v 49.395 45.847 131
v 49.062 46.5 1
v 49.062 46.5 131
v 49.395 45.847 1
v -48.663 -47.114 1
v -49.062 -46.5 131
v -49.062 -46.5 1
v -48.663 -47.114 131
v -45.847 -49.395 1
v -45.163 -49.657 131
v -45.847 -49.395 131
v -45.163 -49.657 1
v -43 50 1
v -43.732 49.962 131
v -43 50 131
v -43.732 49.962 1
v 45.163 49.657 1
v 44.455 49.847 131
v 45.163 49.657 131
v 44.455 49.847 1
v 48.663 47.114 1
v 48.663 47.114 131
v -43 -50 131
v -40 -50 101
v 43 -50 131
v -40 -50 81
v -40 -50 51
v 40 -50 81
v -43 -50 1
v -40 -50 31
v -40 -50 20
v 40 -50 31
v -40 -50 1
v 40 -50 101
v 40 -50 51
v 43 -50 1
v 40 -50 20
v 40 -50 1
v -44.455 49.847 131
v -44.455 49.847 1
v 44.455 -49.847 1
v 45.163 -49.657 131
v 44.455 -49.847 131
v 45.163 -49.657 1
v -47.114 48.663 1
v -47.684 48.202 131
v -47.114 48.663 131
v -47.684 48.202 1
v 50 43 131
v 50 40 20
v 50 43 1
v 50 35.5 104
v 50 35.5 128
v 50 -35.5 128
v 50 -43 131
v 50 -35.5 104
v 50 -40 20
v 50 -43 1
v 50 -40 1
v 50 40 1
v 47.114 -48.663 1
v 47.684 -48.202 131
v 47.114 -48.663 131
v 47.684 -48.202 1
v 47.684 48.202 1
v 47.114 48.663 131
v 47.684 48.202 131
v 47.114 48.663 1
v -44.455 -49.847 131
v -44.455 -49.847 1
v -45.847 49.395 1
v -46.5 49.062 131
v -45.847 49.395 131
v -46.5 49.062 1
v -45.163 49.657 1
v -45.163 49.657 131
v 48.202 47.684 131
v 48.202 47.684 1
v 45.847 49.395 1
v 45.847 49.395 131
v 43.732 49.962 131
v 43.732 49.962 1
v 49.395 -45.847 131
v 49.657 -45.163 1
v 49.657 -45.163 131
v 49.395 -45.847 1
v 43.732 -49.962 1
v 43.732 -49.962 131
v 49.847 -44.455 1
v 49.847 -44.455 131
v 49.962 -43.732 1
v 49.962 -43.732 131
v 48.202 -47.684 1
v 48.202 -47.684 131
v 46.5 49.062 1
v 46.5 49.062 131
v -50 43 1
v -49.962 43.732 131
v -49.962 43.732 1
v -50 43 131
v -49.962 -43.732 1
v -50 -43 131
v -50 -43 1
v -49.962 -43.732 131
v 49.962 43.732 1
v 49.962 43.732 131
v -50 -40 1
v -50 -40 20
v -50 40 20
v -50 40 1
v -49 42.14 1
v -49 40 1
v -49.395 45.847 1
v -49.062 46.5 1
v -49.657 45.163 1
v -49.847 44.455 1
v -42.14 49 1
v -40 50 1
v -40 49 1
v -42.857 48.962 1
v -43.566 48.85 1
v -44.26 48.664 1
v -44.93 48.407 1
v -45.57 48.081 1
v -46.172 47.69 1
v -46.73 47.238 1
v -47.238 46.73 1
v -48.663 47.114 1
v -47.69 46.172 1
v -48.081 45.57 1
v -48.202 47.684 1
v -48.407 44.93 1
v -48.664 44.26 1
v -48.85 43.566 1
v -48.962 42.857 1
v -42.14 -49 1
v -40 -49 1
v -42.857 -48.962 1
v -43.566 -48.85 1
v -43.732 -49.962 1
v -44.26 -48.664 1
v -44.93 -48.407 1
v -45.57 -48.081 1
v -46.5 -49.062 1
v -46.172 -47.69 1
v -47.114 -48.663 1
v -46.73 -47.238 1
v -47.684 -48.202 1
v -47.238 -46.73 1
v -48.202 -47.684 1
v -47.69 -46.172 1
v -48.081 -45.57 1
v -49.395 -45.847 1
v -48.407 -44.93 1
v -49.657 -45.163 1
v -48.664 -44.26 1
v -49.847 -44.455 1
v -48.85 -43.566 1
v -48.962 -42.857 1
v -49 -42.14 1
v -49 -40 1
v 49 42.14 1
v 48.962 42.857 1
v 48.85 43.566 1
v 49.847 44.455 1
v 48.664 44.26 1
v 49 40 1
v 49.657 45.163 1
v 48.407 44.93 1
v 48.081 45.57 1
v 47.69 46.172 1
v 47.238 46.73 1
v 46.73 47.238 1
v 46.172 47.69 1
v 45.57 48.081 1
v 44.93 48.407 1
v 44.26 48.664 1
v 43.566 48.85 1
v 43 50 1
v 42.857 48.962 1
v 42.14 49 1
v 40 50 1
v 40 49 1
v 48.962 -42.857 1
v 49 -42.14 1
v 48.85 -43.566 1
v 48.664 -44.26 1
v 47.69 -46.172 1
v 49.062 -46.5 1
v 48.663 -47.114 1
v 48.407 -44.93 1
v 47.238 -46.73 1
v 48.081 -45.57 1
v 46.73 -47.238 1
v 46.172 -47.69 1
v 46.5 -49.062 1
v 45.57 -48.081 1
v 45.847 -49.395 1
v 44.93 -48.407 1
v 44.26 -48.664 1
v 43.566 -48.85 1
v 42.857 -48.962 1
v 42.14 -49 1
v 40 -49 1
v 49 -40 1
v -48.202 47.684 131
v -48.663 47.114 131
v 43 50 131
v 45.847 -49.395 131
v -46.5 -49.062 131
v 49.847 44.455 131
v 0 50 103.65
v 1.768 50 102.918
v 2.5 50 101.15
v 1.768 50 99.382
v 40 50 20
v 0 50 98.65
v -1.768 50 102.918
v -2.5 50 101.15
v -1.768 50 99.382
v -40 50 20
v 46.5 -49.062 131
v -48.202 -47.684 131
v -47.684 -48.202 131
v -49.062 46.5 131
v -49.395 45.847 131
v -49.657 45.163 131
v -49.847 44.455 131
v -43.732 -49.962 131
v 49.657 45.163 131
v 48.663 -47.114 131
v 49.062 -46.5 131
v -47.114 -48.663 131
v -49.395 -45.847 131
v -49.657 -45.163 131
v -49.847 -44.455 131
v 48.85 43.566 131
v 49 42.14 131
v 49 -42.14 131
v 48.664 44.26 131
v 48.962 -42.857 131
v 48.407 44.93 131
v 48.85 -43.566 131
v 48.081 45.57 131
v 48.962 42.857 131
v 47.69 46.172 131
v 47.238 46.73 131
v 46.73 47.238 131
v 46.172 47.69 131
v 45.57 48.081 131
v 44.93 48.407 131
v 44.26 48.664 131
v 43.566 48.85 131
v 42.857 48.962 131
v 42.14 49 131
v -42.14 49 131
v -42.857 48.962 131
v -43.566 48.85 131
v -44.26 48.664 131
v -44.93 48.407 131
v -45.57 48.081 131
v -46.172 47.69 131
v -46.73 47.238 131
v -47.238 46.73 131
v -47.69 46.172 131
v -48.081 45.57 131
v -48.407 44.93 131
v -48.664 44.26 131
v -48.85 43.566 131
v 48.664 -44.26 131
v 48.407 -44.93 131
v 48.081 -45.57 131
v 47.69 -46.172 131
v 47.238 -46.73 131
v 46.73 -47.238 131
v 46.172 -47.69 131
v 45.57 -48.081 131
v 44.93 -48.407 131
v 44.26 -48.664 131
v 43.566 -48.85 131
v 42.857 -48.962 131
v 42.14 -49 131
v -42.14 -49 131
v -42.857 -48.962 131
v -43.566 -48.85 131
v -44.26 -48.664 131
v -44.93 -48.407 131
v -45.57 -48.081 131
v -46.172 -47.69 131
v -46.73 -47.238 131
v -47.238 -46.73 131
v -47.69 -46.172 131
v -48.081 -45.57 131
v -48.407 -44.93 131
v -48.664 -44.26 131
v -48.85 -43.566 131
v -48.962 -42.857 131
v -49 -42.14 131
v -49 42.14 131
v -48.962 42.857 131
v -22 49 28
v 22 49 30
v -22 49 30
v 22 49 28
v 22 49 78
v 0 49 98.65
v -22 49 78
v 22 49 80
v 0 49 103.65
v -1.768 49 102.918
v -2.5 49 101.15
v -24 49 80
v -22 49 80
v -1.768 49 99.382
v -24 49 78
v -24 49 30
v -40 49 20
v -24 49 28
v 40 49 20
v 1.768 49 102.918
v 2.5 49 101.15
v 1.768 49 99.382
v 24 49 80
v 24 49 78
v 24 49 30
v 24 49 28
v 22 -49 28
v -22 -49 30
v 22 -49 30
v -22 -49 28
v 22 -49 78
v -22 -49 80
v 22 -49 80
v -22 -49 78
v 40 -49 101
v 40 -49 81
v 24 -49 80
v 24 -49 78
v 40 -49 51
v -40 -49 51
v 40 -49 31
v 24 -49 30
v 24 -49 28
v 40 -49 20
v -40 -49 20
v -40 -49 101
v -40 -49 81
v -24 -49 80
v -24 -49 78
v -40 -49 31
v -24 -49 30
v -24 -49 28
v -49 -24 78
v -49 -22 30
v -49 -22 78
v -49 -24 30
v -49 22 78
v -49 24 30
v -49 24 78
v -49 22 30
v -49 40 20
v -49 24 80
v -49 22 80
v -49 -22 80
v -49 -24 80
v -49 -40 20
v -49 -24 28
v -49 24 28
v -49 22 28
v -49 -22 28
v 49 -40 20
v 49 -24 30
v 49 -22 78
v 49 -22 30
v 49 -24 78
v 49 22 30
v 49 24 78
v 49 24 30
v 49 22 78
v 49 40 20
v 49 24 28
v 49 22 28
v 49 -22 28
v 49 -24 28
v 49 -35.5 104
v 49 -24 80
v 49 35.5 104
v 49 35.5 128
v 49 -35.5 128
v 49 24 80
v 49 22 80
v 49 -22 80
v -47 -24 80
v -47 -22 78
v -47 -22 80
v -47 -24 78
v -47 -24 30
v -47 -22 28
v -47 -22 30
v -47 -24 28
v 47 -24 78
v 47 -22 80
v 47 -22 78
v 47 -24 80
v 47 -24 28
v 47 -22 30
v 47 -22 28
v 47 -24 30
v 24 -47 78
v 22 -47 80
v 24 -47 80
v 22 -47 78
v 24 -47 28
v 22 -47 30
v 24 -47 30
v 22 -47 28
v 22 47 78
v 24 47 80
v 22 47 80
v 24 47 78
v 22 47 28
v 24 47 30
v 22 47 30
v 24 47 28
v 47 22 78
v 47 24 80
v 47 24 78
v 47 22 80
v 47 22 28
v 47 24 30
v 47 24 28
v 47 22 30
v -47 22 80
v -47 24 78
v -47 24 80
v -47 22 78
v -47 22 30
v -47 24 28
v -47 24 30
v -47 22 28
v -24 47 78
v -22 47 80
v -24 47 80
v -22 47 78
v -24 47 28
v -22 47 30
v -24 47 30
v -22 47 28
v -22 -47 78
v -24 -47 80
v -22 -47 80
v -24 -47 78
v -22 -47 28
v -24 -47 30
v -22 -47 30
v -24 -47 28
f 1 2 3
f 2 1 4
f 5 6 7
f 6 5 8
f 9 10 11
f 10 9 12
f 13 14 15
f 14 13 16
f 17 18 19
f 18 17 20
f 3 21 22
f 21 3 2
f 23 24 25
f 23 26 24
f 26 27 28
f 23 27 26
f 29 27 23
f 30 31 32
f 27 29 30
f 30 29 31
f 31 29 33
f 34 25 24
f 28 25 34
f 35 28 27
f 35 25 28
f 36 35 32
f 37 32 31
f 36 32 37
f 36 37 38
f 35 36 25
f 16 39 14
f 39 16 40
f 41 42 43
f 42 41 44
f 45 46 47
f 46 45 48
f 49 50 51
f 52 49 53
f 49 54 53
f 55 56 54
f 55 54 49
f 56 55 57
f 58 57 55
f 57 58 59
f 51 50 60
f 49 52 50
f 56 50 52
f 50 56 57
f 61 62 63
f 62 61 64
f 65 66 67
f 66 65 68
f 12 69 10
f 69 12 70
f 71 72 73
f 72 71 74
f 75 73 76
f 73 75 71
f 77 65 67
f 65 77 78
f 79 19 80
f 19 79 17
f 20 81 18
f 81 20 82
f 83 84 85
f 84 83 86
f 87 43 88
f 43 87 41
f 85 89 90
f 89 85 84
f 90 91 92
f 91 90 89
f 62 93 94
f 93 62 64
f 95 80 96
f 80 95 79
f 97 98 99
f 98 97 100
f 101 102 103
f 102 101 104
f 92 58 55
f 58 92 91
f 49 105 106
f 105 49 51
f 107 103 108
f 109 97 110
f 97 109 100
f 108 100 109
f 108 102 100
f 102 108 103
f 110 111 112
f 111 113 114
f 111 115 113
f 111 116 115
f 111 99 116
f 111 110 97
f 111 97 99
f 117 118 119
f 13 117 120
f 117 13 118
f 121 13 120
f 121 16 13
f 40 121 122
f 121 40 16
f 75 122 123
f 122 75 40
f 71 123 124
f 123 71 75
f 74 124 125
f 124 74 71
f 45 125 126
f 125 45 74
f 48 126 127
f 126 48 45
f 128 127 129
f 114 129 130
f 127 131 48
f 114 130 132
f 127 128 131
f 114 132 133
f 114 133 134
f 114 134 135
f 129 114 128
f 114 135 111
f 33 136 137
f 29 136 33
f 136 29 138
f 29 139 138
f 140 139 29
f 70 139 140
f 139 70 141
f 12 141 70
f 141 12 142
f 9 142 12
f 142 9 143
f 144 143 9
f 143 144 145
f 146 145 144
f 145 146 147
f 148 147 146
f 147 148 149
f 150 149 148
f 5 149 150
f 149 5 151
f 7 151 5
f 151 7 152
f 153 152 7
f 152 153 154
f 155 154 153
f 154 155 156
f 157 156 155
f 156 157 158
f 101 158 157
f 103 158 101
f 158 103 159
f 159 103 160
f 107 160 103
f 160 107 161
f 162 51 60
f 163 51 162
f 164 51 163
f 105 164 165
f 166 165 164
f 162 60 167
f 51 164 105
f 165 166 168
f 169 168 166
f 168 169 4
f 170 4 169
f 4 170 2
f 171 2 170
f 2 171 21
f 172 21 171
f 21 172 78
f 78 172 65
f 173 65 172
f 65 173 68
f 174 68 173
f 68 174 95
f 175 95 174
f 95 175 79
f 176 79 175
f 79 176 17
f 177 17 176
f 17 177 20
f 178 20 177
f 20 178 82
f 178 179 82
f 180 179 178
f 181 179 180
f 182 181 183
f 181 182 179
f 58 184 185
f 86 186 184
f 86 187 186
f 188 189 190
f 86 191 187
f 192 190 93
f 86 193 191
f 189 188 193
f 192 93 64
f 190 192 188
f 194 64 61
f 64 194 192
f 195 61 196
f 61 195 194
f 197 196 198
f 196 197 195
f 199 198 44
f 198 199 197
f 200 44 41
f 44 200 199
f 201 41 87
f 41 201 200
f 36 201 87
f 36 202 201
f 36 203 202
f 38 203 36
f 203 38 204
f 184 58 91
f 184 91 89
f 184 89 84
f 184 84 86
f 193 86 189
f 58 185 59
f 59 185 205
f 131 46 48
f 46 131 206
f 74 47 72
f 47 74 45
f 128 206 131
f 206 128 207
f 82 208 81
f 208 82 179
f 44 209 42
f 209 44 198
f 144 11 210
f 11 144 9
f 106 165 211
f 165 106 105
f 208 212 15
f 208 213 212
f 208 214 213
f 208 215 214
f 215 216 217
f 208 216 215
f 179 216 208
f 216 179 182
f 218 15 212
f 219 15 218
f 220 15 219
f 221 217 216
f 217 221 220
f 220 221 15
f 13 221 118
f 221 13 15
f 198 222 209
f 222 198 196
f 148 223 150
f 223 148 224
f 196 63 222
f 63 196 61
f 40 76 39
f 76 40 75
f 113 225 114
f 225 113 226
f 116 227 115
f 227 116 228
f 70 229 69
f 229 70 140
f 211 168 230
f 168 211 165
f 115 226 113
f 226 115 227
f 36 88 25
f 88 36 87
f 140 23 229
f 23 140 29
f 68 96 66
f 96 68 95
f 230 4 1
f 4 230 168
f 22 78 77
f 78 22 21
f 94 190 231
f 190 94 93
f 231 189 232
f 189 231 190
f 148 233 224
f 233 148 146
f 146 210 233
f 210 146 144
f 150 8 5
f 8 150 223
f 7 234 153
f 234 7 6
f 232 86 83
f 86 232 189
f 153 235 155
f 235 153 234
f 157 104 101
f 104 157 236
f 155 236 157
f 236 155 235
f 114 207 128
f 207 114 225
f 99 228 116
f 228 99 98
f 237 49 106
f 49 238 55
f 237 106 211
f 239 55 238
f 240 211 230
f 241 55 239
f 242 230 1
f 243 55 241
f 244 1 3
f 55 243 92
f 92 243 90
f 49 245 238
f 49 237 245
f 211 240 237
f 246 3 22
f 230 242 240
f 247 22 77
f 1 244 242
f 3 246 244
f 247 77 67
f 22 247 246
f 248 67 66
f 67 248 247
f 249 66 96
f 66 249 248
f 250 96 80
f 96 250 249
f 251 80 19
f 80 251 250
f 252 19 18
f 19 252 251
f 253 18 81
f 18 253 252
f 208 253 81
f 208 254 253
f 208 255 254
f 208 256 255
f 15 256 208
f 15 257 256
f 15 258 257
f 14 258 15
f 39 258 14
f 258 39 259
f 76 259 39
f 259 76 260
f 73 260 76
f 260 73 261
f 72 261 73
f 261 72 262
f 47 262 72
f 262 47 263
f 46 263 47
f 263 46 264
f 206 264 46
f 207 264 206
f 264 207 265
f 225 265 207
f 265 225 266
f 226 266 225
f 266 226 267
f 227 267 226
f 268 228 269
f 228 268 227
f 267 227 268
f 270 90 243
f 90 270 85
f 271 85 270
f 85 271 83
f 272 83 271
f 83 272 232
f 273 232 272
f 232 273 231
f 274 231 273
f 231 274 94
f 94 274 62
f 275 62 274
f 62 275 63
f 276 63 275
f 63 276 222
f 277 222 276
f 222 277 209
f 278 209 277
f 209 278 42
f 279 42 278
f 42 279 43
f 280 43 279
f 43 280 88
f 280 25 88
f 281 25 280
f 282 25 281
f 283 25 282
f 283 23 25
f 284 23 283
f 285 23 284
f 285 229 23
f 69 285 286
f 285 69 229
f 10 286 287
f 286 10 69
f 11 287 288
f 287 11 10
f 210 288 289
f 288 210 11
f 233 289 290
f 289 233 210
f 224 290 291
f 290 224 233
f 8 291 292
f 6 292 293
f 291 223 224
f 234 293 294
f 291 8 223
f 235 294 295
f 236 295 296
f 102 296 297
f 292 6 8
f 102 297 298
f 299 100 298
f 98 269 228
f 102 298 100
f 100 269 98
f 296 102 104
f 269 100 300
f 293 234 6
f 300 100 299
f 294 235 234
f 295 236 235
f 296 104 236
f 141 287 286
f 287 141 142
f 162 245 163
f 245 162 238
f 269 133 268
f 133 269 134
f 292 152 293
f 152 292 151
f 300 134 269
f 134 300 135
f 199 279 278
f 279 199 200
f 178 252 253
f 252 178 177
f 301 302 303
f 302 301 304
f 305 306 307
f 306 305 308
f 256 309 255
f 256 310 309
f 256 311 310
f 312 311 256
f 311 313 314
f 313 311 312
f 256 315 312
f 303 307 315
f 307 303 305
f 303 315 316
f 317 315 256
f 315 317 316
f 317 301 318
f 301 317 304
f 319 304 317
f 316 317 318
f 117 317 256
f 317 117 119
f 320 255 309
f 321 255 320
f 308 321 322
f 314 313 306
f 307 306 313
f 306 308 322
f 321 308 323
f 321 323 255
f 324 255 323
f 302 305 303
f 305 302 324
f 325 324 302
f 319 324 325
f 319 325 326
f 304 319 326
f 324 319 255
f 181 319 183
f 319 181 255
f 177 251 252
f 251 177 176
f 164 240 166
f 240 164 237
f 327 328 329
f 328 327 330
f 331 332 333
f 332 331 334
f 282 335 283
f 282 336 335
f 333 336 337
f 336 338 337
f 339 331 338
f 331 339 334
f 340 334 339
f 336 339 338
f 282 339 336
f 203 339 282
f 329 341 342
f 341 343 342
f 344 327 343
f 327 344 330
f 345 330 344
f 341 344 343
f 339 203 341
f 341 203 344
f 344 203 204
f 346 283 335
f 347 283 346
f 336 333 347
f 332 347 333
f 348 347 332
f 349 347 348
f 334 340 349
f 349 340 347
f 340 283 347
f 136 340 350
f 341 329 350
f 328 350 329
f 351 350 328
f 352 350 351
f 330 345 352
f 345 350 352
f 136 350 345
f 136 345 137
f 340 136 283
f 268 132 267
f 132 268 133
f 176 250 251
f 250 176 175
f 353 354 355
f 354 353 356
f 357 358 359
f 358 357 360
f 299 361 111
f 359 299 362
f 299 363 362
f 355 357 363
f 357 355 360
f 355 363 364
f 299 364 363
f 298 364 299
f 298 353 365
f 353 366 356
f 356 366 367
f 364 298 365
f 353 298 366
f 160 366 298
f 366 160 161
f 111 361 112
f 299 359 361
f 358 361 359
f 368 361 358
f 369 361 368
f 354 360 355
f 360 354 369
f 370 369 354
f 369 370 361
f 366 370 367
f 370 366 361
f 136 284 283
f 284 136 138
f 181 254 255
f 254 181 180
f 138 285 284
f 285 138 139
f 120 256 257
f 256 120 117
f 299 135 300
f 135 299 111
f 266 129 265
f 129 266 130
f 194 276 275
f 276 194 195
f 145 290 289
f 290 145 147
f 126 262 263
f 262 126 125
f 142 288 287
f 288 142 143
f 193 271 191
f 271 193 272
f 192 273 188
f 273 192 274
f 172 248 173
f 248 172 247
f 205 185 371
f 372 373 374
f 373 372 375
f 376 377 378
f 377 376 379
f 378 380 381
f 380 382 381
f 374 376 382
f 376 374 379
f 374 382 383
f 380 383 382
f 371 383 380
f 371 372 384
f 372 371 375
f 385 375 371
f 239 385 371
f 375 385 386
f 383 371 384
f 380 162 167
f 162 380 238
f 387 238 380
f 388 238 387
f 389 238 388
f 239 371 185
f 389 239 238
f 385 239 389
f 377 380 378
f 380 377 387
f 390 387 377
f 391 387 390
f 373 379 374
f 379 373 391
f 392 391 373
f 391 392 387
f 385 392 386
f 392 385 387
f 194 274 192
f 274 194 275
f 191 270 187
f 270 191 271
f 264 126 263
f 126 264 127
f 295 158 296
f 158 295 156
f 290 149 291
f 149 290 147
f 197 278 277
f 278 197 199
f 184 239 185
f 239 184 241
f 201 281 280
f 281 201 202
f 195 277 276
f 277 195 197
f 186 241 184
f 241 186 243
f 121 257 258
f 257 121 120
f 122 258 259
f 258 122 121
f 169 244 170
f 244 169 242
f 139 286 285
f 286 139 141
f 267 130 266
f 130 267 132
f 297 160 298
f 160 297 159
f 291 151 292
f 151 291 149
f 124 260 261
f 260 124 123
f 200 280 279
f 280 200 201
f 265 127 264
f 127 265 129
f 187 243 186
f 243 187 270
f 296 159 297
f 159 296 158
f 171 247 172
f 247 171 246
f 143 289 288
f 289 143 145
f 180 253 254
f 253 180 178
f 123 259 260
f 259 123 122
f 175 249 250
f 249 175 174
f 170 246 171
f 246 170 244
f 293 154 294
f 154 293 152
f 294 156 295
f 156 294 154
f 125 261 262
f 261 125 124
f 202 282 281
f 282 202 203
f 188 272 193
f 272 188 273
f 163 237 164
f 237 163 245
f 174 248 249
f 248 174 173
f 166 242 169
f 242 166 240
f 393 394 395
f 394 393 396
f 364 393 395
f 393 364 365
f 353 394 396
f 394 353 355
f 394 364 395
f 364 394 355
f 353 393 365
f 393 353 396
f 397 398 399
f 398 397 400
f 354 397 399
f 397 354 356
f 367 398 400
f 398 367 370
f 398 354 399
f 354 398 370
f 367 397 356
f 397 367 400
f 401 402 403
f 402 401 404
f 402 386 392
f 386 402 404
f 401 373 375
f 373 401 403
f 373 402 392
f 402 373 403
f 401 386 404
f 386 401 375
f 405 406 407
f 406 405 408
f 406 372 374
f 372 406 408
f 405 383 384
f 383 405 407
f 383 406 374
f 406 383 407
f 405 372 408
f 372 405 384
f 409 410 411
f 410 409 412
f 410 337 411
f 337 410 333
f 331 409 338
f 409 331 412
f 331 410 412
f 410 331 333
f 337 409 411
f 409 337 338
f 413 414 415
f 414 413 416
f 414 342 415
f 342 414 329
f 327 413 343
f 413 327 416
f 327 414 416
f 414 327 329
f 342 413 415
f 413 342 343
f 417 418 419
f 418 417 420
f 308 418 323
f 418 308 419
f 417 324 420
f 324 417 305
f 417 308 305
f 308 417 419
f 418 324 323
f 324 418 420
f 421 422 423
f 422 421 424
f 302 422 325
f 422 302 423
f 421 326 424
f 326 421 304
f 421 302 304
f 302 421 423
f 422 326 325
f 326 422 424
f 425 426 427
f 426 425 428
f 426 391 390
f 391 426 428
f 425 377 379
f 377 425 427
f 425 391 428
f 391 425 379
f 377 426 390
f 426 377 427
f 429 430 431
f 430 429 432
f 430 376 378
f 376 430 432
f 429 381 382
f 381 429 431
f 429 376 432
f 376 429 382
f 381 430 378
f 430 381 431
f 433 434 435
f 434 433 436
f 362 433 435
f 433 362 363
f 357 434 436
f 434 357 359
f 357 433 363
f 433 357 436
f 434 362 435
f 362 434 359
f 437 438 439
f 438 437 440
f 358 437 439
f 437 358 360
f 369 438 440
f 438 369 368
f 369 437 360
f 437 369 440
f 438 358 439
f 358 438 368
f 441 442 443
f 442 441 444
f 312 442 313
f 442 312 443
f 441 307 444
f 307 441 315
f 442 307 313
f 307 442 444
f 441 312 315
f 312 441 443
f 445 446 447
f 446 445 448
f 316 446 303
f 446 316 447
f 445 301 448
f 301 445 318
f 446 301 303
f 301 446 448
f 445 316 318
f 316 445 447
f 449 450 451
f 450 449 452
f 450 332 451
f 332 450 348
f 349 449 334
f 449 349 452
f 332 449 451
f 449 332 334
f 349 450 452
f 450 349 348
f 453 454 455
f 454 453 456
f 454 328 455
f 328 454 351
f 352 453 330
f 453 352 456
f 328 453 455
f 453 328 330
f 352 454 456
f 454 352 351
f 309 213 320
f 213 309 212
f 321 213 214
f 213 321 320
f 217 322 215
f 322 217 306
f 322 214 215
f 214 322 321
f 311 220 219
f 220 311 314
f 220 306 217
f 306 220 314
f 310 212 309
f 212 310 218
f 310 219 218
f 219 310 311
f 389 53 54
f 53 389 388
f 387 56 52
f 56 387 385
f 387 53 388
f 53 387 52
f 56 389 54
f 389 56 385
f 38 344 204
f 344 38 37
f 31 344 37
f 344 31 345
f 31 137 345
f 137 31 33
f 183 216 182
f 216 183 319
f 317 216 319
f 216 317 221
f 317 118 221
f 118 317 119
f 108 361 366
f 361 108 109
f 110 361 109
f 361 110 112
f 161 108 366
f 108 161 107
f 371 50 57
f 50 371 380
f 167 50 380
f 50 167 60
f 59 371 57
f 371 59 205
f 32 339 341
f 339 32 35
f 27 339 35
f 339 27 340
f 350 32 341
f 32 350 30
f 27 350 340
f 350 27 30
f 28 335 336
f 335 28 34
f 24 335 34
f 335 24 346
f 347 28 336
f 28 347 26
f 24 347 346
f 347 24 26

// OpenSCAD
// ejemplo de modulo

Altura = 130;
Ancho = 100;
Grosor = 1;

Hueco_motor_diametro = 5.5;

Hueco_LCD_h = 24;
Hueco_LCD_w = 71;

Hueco_base_w = 50;
Hueco_base_h = 86;

Soporte = Ancho;
Correccion_soporte_largo = Ancho - 40;
Correccion_soporte_ancho = 10;

Repisa1 = Altura-50;
Repisa2 = Altura-100;

Altura_Nema17 = 42.3;

Taco = 2;

Abertura = 10;
Abertura_h = 20;

module rectangulo_vacio_bordes_redondeados(ancho, profundidad, altura, grosor, diametro, alt_c)
{
    //translate([diametro/2, diametro/2, 0])
        difference()
        {
            minkowski()
            {
                cube([ancho-diametro, profundidad-diametro, altura-alt_c], center = true);
                cylinder(d=diametro, h=alt_c, $fn=60, center = false);
                
            }
            //translate([1,1,0])
            scale([0.98,0.98,1])
            minkowski()
            {
                cube([ancho-diametro, profundidad-diametro, altura], center = true);
                cylinder(d=diametro, h=alt_c, $fn=60, center = false);
                
            }
            
        }
    
}

module mirror_copy ( v = [1,0,0]){
    children();
    mirror(v) children();
}

// Crear solo un cuarto del cilindro vacío

difference(){
    
    union(){
        translate([0,0,Altura/2])
        rectangulo_vacio_bordes_redondeados(Ancho, Ancho, Altura, Grosor, 14, 2);
        
        //Tacos Sujecion Repisa1
        
            for (i = [0:3]) {
                
                rotate([0, 0, i * 90]) {
                    
                    mirror_copy() {
                        translate([-Ancho/2 + Grosor, -Ancho/4 + Grosor, Repisa1 - Taco])
                        cube(size = Taco, center = false);
                        
                        translate([-Ancho/2 + Grosor, -Ancho/4 + Grosor, Repisa2 - Taco])
                        cube(size = Taco, center = false);
                    }
                    
                }
}

              
        }     
        
        //Hueco Motor Nema17
        translate([0, Ancho/2 + Grosor, Repisa1 + 1/2 * Altura_Nema17])
        rotate([90, 0, 0])
        cylinder(h=Grosor*2, d=5);
    
        
        //Hueco LCD
        translate([Ancho/2-1, -Hueco_LCD_w/2, Altura - Hueco_LCD_h - 2])
        cube([Grosor*2, Hueco_LCD_w, Hueco_LCD_h], center = false);
    
          //Abertura en paredes Suelo
        translate([-Ancho/2+Abertura,-Ancho/2,0])
        cube([Ancho-Abertura*2,Grosor,Abertura_h], center = false);
    
        translate([-Ancho/2+Abertura,Ancho/2-1,0])
        cube([Ancho-Abertura*2,Grosor,Abertura_h], center = false);
    
        translate([-Ancho/2,-Ancho/2 + Abertura,0])
        cube([Grosor,Ancho-Abertura*2,Abertura_h], center = false);
        
        translate([Ancho/2-1,-Ancho/2 + Abertura,0])
        cube([Grosor,Ancho-Abertura*2,Abertura_h], center = false);
        
        //Abertura en pared Trasera
        translate([-Ancho/2+Abertura,-Ancho/2,Repisa2+Grosor])
        cube([Ancho-Abertura*2,Grosor,Abertura_h], center = false);
        
        //Abertura en pared Trasera
        translate([-Ancho/2+Abertura,-Ancho/2,Repisa1+Grosor])
        cube([Ancho-Abertura*2,Grosor,Abertura_h], center = false);
    
}
